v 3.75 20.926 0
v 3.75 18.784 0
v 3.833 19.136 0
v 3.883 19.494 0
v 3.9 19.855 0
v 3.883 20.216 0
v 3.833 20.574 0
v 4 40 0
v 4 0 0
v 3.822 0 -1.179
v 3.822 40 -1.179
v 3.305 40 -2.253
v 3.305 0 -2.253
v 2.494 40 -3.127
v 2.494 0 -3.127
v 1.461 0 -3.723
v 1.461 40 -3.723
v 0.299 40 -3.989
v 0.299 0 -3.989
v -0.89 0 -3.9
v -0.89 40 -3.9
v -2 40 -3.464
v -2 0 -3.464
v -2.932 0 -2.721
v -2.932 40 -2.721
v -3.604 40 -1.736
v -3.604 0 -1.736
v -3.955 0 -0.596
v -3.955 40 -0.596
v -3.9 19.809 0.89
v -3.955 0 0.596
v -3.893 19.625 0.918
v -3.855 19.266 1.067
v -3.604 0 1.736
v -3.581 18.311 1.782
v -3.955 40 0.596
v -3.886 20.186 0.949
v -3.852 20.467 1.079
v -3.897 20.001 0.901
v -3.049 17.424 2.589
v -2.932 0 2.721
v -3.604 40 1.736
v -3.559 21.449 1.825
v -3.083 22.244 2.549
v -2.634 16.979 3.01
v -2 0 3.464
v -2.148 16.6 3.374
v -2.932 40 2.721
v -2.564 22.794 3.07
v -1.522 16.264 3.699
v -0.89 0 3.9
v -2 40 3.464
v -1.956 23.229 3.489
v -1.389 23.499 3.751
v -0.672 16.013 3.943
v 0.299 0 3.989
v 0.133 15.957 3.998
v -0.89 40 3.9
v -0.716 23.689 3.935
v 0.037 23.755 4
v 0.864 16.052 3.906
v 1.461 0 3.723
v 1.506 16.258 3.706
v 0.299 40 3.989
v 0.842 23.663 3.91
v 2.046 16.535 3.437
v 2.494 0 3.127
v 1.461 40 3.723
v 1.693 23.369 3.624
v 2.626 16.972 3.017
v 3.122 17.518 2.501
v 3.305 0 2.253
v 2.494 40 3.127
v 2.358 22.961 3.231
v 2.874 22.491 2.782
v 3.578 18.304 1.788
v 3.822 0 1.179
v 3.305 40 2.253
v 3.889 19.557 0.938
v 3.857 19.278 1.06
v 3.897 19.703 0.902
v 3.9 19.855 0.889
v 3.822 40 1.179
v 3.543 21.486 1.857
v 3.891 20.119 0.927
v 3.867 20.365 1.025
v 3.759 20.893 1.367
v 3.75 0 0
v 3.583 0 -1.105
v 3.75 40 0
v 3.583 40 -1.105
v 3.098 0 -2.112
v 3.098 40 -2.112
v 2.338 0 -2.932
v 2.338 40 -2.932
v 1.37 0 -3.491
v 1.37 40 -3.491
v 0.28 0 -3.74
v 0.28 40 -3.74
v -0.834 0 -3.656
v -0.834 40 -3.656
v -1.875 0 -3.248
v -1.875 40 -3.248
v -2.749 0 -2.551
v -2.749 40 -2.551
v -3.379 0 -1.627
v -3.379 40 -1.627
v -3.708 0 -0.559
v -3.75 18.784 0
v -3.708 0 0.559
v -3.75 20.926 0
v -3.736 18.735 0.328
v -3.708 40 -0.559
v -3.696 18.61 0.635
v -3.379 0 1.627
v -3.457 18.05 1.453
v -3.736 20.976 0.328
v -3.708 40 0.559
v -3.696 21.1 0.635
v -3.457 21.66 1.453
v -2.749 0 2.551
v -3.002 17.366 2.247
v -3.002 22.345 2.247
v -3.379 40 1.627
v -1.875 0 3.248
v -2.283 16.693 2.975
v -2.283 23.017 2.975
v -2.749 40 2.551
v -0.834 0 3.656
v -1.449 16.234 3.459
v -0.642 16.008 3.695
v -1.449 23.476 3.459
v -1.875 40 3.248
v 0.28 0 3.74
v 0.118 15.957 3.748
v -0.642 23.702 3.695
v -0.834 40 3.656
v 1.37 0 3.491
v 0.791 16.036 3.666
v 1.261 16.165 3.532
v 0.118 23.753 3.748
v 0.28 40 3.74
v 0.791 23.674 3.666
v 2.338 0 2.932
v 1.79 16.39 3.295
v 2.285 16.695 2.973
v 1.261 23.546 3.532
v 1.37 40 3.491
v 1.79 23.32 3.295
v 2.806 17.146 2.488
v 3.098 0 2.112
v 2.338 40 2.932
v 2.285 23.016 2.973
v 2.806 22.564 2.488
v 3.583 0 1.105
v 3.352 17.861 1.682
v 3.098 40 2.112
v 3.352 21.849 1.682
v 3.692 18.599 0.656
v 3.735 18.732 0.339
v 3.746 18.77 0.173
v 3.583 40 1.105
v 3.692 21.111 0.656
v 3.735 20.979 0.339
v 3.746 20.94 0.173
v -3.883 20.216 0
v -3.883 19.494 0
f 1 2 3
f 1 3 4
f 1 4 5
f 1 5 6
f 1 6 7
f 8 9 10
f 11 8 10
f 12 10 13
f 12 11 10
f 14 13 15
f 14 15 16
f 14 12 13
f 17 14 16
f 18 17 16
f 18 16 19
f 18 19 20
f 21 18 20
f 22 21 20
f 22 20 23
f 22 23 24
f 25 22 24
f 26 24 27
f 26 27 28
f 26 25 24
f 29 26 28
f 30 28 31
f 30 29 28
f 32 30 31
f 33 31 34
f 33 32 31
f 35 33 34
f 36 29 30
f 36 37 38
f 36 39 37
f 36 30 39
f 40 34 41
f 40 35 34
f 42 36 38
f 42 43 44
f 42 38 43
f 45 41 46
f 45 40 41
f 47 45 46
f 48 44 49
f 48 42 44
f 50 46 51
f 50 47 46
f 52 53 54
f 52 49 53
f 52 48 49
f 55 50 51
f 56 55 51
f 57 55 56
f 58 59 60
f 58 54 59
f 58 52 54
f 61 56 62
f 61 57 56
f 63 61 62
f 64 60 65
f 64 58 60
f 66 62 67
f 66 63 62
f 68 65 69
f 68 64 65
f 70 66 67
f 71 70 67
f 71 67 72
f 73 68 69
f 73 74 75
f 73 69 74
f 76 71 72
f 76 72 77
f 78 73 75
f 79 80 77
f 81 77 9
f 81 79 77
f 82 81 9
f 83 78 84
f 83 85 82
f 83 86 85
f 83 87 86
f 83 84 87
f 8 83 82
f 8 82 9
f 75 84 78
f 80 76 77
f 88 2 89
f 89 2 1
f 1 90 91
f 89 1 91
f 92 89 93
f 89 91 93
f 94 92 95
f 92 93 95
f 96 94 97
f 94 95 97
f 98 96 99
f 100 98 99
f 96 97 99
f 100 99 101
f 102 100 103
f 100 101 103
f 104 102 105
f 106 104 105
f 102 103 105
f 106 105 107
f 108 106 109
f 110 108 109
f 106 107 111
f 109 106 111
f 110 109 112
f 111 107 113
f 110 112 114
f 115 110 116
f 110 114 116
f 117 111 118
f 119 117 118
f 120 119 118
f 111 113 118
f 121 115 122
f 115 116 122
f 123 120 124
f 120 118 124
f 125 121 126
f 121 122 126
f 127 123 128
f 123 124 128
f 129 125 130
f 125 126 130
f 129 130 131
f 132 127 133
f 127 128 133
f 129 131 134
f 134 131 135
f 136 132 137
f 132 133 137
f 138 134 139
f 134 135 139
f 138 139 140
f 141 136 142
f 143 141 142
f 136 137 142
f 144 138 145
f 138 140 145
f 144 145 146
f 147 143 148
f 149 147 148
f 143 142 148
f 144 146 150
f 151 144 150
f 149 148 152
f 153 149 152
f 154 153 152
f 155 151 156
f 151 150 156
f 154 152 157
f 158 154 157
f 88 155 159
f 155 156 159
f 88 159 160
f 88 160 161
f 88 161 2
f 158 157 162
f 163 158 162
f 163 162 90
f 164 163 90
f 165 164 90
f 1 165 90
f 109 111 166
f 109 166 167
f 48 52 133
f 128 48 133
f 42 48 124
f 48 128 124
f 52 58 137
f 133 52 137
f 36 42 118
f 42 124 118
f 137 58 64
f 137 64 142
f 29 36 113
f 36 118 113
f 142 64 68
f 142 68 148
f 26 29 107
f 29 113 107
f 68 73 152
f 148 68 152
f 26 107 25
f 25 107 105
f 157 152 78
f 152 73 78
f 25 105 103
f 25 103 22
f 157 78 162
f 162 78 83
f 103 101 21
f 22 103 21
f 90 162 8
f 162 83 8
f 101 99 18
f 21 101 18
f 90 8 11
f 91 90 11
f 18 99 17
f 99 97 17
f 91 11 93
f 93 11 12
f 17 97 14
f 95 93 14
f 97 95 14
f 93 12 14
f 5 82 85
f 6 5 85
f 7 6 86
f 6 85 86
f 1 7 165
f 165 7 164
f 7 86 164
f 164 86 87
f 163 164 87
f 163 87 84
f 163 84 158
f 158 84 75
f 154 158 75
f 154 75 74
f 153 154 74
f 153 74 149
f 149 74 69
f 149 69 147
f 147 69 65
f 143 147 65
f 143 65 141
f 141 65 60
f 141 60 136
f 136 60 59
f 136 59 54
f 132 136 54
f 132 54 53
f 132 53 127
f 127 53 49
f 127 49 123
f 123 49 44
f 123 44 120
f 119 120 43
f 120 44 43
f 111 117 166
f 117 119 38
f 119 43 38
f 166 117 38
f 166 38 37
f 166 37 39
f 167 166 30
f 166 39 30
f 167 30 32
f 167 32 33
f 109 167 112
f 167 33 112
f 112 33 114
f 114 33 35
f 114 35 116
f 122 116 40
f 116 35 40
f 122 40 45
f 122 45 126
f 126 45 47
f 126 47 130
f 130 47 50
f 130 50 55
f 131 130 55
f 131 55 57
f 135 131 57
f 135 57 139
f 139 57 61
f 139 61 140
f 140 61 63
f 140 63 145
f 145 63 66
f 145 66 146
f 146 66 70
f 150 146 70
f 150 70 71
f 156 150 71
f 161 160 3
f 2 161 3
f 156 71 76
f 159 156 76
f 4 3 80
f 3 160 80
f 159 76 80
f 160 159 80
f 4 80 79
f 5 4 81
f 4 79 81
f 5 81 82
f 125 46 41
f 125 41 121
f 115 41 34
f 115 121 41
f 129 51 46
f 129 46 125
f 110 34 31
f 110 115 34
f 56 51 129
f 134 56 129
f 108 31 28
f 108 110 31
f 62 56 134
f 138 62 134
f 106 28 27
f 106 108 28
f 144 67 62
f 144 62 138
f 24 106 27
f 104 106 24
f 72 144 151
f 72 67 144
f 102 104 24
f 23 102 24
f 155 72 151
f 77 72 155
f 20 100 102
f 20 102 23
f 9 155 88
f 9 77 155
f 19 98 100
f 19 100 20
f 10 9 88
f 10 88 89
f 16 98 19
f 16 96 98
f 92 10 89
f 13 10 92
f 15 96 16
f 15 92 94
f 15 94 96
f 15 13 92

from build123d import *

# Parameters (mm, degrees)
F0_R   = 4
F0_R_2 = 3.75
F3_R   = 3.9


with BuildPart() as f2:
    # F2: sweep along a path in F1
    with BuildLine(Plane.XY) as f2_path:
        Line((0, 0), (0, 40))
    # F0 (on Front) → F2 (sweep)
    with BuildSketch(Plane.XZ):
        Circle(F0_R)
        Circle(F0_R_2, mode=Mode.SUBTRACT)
    sweep(path=f2_path.line)

    # F5: sweep along a path in F4
    with BuildLine(Plane.YZ) as f5_path:
        Line((21.1965255439, 0), (21.1965255439, 30))
    # F3 (on Top) → F5 (sweep, cut)
    with BuildSketch(Plane.XY):
        with Locations((0, 19.8551610578)):
            Circle(F3_R)
    sweep(path=f5_path.line, mode=Mode.SUBTRACT)


solid = f2.part
